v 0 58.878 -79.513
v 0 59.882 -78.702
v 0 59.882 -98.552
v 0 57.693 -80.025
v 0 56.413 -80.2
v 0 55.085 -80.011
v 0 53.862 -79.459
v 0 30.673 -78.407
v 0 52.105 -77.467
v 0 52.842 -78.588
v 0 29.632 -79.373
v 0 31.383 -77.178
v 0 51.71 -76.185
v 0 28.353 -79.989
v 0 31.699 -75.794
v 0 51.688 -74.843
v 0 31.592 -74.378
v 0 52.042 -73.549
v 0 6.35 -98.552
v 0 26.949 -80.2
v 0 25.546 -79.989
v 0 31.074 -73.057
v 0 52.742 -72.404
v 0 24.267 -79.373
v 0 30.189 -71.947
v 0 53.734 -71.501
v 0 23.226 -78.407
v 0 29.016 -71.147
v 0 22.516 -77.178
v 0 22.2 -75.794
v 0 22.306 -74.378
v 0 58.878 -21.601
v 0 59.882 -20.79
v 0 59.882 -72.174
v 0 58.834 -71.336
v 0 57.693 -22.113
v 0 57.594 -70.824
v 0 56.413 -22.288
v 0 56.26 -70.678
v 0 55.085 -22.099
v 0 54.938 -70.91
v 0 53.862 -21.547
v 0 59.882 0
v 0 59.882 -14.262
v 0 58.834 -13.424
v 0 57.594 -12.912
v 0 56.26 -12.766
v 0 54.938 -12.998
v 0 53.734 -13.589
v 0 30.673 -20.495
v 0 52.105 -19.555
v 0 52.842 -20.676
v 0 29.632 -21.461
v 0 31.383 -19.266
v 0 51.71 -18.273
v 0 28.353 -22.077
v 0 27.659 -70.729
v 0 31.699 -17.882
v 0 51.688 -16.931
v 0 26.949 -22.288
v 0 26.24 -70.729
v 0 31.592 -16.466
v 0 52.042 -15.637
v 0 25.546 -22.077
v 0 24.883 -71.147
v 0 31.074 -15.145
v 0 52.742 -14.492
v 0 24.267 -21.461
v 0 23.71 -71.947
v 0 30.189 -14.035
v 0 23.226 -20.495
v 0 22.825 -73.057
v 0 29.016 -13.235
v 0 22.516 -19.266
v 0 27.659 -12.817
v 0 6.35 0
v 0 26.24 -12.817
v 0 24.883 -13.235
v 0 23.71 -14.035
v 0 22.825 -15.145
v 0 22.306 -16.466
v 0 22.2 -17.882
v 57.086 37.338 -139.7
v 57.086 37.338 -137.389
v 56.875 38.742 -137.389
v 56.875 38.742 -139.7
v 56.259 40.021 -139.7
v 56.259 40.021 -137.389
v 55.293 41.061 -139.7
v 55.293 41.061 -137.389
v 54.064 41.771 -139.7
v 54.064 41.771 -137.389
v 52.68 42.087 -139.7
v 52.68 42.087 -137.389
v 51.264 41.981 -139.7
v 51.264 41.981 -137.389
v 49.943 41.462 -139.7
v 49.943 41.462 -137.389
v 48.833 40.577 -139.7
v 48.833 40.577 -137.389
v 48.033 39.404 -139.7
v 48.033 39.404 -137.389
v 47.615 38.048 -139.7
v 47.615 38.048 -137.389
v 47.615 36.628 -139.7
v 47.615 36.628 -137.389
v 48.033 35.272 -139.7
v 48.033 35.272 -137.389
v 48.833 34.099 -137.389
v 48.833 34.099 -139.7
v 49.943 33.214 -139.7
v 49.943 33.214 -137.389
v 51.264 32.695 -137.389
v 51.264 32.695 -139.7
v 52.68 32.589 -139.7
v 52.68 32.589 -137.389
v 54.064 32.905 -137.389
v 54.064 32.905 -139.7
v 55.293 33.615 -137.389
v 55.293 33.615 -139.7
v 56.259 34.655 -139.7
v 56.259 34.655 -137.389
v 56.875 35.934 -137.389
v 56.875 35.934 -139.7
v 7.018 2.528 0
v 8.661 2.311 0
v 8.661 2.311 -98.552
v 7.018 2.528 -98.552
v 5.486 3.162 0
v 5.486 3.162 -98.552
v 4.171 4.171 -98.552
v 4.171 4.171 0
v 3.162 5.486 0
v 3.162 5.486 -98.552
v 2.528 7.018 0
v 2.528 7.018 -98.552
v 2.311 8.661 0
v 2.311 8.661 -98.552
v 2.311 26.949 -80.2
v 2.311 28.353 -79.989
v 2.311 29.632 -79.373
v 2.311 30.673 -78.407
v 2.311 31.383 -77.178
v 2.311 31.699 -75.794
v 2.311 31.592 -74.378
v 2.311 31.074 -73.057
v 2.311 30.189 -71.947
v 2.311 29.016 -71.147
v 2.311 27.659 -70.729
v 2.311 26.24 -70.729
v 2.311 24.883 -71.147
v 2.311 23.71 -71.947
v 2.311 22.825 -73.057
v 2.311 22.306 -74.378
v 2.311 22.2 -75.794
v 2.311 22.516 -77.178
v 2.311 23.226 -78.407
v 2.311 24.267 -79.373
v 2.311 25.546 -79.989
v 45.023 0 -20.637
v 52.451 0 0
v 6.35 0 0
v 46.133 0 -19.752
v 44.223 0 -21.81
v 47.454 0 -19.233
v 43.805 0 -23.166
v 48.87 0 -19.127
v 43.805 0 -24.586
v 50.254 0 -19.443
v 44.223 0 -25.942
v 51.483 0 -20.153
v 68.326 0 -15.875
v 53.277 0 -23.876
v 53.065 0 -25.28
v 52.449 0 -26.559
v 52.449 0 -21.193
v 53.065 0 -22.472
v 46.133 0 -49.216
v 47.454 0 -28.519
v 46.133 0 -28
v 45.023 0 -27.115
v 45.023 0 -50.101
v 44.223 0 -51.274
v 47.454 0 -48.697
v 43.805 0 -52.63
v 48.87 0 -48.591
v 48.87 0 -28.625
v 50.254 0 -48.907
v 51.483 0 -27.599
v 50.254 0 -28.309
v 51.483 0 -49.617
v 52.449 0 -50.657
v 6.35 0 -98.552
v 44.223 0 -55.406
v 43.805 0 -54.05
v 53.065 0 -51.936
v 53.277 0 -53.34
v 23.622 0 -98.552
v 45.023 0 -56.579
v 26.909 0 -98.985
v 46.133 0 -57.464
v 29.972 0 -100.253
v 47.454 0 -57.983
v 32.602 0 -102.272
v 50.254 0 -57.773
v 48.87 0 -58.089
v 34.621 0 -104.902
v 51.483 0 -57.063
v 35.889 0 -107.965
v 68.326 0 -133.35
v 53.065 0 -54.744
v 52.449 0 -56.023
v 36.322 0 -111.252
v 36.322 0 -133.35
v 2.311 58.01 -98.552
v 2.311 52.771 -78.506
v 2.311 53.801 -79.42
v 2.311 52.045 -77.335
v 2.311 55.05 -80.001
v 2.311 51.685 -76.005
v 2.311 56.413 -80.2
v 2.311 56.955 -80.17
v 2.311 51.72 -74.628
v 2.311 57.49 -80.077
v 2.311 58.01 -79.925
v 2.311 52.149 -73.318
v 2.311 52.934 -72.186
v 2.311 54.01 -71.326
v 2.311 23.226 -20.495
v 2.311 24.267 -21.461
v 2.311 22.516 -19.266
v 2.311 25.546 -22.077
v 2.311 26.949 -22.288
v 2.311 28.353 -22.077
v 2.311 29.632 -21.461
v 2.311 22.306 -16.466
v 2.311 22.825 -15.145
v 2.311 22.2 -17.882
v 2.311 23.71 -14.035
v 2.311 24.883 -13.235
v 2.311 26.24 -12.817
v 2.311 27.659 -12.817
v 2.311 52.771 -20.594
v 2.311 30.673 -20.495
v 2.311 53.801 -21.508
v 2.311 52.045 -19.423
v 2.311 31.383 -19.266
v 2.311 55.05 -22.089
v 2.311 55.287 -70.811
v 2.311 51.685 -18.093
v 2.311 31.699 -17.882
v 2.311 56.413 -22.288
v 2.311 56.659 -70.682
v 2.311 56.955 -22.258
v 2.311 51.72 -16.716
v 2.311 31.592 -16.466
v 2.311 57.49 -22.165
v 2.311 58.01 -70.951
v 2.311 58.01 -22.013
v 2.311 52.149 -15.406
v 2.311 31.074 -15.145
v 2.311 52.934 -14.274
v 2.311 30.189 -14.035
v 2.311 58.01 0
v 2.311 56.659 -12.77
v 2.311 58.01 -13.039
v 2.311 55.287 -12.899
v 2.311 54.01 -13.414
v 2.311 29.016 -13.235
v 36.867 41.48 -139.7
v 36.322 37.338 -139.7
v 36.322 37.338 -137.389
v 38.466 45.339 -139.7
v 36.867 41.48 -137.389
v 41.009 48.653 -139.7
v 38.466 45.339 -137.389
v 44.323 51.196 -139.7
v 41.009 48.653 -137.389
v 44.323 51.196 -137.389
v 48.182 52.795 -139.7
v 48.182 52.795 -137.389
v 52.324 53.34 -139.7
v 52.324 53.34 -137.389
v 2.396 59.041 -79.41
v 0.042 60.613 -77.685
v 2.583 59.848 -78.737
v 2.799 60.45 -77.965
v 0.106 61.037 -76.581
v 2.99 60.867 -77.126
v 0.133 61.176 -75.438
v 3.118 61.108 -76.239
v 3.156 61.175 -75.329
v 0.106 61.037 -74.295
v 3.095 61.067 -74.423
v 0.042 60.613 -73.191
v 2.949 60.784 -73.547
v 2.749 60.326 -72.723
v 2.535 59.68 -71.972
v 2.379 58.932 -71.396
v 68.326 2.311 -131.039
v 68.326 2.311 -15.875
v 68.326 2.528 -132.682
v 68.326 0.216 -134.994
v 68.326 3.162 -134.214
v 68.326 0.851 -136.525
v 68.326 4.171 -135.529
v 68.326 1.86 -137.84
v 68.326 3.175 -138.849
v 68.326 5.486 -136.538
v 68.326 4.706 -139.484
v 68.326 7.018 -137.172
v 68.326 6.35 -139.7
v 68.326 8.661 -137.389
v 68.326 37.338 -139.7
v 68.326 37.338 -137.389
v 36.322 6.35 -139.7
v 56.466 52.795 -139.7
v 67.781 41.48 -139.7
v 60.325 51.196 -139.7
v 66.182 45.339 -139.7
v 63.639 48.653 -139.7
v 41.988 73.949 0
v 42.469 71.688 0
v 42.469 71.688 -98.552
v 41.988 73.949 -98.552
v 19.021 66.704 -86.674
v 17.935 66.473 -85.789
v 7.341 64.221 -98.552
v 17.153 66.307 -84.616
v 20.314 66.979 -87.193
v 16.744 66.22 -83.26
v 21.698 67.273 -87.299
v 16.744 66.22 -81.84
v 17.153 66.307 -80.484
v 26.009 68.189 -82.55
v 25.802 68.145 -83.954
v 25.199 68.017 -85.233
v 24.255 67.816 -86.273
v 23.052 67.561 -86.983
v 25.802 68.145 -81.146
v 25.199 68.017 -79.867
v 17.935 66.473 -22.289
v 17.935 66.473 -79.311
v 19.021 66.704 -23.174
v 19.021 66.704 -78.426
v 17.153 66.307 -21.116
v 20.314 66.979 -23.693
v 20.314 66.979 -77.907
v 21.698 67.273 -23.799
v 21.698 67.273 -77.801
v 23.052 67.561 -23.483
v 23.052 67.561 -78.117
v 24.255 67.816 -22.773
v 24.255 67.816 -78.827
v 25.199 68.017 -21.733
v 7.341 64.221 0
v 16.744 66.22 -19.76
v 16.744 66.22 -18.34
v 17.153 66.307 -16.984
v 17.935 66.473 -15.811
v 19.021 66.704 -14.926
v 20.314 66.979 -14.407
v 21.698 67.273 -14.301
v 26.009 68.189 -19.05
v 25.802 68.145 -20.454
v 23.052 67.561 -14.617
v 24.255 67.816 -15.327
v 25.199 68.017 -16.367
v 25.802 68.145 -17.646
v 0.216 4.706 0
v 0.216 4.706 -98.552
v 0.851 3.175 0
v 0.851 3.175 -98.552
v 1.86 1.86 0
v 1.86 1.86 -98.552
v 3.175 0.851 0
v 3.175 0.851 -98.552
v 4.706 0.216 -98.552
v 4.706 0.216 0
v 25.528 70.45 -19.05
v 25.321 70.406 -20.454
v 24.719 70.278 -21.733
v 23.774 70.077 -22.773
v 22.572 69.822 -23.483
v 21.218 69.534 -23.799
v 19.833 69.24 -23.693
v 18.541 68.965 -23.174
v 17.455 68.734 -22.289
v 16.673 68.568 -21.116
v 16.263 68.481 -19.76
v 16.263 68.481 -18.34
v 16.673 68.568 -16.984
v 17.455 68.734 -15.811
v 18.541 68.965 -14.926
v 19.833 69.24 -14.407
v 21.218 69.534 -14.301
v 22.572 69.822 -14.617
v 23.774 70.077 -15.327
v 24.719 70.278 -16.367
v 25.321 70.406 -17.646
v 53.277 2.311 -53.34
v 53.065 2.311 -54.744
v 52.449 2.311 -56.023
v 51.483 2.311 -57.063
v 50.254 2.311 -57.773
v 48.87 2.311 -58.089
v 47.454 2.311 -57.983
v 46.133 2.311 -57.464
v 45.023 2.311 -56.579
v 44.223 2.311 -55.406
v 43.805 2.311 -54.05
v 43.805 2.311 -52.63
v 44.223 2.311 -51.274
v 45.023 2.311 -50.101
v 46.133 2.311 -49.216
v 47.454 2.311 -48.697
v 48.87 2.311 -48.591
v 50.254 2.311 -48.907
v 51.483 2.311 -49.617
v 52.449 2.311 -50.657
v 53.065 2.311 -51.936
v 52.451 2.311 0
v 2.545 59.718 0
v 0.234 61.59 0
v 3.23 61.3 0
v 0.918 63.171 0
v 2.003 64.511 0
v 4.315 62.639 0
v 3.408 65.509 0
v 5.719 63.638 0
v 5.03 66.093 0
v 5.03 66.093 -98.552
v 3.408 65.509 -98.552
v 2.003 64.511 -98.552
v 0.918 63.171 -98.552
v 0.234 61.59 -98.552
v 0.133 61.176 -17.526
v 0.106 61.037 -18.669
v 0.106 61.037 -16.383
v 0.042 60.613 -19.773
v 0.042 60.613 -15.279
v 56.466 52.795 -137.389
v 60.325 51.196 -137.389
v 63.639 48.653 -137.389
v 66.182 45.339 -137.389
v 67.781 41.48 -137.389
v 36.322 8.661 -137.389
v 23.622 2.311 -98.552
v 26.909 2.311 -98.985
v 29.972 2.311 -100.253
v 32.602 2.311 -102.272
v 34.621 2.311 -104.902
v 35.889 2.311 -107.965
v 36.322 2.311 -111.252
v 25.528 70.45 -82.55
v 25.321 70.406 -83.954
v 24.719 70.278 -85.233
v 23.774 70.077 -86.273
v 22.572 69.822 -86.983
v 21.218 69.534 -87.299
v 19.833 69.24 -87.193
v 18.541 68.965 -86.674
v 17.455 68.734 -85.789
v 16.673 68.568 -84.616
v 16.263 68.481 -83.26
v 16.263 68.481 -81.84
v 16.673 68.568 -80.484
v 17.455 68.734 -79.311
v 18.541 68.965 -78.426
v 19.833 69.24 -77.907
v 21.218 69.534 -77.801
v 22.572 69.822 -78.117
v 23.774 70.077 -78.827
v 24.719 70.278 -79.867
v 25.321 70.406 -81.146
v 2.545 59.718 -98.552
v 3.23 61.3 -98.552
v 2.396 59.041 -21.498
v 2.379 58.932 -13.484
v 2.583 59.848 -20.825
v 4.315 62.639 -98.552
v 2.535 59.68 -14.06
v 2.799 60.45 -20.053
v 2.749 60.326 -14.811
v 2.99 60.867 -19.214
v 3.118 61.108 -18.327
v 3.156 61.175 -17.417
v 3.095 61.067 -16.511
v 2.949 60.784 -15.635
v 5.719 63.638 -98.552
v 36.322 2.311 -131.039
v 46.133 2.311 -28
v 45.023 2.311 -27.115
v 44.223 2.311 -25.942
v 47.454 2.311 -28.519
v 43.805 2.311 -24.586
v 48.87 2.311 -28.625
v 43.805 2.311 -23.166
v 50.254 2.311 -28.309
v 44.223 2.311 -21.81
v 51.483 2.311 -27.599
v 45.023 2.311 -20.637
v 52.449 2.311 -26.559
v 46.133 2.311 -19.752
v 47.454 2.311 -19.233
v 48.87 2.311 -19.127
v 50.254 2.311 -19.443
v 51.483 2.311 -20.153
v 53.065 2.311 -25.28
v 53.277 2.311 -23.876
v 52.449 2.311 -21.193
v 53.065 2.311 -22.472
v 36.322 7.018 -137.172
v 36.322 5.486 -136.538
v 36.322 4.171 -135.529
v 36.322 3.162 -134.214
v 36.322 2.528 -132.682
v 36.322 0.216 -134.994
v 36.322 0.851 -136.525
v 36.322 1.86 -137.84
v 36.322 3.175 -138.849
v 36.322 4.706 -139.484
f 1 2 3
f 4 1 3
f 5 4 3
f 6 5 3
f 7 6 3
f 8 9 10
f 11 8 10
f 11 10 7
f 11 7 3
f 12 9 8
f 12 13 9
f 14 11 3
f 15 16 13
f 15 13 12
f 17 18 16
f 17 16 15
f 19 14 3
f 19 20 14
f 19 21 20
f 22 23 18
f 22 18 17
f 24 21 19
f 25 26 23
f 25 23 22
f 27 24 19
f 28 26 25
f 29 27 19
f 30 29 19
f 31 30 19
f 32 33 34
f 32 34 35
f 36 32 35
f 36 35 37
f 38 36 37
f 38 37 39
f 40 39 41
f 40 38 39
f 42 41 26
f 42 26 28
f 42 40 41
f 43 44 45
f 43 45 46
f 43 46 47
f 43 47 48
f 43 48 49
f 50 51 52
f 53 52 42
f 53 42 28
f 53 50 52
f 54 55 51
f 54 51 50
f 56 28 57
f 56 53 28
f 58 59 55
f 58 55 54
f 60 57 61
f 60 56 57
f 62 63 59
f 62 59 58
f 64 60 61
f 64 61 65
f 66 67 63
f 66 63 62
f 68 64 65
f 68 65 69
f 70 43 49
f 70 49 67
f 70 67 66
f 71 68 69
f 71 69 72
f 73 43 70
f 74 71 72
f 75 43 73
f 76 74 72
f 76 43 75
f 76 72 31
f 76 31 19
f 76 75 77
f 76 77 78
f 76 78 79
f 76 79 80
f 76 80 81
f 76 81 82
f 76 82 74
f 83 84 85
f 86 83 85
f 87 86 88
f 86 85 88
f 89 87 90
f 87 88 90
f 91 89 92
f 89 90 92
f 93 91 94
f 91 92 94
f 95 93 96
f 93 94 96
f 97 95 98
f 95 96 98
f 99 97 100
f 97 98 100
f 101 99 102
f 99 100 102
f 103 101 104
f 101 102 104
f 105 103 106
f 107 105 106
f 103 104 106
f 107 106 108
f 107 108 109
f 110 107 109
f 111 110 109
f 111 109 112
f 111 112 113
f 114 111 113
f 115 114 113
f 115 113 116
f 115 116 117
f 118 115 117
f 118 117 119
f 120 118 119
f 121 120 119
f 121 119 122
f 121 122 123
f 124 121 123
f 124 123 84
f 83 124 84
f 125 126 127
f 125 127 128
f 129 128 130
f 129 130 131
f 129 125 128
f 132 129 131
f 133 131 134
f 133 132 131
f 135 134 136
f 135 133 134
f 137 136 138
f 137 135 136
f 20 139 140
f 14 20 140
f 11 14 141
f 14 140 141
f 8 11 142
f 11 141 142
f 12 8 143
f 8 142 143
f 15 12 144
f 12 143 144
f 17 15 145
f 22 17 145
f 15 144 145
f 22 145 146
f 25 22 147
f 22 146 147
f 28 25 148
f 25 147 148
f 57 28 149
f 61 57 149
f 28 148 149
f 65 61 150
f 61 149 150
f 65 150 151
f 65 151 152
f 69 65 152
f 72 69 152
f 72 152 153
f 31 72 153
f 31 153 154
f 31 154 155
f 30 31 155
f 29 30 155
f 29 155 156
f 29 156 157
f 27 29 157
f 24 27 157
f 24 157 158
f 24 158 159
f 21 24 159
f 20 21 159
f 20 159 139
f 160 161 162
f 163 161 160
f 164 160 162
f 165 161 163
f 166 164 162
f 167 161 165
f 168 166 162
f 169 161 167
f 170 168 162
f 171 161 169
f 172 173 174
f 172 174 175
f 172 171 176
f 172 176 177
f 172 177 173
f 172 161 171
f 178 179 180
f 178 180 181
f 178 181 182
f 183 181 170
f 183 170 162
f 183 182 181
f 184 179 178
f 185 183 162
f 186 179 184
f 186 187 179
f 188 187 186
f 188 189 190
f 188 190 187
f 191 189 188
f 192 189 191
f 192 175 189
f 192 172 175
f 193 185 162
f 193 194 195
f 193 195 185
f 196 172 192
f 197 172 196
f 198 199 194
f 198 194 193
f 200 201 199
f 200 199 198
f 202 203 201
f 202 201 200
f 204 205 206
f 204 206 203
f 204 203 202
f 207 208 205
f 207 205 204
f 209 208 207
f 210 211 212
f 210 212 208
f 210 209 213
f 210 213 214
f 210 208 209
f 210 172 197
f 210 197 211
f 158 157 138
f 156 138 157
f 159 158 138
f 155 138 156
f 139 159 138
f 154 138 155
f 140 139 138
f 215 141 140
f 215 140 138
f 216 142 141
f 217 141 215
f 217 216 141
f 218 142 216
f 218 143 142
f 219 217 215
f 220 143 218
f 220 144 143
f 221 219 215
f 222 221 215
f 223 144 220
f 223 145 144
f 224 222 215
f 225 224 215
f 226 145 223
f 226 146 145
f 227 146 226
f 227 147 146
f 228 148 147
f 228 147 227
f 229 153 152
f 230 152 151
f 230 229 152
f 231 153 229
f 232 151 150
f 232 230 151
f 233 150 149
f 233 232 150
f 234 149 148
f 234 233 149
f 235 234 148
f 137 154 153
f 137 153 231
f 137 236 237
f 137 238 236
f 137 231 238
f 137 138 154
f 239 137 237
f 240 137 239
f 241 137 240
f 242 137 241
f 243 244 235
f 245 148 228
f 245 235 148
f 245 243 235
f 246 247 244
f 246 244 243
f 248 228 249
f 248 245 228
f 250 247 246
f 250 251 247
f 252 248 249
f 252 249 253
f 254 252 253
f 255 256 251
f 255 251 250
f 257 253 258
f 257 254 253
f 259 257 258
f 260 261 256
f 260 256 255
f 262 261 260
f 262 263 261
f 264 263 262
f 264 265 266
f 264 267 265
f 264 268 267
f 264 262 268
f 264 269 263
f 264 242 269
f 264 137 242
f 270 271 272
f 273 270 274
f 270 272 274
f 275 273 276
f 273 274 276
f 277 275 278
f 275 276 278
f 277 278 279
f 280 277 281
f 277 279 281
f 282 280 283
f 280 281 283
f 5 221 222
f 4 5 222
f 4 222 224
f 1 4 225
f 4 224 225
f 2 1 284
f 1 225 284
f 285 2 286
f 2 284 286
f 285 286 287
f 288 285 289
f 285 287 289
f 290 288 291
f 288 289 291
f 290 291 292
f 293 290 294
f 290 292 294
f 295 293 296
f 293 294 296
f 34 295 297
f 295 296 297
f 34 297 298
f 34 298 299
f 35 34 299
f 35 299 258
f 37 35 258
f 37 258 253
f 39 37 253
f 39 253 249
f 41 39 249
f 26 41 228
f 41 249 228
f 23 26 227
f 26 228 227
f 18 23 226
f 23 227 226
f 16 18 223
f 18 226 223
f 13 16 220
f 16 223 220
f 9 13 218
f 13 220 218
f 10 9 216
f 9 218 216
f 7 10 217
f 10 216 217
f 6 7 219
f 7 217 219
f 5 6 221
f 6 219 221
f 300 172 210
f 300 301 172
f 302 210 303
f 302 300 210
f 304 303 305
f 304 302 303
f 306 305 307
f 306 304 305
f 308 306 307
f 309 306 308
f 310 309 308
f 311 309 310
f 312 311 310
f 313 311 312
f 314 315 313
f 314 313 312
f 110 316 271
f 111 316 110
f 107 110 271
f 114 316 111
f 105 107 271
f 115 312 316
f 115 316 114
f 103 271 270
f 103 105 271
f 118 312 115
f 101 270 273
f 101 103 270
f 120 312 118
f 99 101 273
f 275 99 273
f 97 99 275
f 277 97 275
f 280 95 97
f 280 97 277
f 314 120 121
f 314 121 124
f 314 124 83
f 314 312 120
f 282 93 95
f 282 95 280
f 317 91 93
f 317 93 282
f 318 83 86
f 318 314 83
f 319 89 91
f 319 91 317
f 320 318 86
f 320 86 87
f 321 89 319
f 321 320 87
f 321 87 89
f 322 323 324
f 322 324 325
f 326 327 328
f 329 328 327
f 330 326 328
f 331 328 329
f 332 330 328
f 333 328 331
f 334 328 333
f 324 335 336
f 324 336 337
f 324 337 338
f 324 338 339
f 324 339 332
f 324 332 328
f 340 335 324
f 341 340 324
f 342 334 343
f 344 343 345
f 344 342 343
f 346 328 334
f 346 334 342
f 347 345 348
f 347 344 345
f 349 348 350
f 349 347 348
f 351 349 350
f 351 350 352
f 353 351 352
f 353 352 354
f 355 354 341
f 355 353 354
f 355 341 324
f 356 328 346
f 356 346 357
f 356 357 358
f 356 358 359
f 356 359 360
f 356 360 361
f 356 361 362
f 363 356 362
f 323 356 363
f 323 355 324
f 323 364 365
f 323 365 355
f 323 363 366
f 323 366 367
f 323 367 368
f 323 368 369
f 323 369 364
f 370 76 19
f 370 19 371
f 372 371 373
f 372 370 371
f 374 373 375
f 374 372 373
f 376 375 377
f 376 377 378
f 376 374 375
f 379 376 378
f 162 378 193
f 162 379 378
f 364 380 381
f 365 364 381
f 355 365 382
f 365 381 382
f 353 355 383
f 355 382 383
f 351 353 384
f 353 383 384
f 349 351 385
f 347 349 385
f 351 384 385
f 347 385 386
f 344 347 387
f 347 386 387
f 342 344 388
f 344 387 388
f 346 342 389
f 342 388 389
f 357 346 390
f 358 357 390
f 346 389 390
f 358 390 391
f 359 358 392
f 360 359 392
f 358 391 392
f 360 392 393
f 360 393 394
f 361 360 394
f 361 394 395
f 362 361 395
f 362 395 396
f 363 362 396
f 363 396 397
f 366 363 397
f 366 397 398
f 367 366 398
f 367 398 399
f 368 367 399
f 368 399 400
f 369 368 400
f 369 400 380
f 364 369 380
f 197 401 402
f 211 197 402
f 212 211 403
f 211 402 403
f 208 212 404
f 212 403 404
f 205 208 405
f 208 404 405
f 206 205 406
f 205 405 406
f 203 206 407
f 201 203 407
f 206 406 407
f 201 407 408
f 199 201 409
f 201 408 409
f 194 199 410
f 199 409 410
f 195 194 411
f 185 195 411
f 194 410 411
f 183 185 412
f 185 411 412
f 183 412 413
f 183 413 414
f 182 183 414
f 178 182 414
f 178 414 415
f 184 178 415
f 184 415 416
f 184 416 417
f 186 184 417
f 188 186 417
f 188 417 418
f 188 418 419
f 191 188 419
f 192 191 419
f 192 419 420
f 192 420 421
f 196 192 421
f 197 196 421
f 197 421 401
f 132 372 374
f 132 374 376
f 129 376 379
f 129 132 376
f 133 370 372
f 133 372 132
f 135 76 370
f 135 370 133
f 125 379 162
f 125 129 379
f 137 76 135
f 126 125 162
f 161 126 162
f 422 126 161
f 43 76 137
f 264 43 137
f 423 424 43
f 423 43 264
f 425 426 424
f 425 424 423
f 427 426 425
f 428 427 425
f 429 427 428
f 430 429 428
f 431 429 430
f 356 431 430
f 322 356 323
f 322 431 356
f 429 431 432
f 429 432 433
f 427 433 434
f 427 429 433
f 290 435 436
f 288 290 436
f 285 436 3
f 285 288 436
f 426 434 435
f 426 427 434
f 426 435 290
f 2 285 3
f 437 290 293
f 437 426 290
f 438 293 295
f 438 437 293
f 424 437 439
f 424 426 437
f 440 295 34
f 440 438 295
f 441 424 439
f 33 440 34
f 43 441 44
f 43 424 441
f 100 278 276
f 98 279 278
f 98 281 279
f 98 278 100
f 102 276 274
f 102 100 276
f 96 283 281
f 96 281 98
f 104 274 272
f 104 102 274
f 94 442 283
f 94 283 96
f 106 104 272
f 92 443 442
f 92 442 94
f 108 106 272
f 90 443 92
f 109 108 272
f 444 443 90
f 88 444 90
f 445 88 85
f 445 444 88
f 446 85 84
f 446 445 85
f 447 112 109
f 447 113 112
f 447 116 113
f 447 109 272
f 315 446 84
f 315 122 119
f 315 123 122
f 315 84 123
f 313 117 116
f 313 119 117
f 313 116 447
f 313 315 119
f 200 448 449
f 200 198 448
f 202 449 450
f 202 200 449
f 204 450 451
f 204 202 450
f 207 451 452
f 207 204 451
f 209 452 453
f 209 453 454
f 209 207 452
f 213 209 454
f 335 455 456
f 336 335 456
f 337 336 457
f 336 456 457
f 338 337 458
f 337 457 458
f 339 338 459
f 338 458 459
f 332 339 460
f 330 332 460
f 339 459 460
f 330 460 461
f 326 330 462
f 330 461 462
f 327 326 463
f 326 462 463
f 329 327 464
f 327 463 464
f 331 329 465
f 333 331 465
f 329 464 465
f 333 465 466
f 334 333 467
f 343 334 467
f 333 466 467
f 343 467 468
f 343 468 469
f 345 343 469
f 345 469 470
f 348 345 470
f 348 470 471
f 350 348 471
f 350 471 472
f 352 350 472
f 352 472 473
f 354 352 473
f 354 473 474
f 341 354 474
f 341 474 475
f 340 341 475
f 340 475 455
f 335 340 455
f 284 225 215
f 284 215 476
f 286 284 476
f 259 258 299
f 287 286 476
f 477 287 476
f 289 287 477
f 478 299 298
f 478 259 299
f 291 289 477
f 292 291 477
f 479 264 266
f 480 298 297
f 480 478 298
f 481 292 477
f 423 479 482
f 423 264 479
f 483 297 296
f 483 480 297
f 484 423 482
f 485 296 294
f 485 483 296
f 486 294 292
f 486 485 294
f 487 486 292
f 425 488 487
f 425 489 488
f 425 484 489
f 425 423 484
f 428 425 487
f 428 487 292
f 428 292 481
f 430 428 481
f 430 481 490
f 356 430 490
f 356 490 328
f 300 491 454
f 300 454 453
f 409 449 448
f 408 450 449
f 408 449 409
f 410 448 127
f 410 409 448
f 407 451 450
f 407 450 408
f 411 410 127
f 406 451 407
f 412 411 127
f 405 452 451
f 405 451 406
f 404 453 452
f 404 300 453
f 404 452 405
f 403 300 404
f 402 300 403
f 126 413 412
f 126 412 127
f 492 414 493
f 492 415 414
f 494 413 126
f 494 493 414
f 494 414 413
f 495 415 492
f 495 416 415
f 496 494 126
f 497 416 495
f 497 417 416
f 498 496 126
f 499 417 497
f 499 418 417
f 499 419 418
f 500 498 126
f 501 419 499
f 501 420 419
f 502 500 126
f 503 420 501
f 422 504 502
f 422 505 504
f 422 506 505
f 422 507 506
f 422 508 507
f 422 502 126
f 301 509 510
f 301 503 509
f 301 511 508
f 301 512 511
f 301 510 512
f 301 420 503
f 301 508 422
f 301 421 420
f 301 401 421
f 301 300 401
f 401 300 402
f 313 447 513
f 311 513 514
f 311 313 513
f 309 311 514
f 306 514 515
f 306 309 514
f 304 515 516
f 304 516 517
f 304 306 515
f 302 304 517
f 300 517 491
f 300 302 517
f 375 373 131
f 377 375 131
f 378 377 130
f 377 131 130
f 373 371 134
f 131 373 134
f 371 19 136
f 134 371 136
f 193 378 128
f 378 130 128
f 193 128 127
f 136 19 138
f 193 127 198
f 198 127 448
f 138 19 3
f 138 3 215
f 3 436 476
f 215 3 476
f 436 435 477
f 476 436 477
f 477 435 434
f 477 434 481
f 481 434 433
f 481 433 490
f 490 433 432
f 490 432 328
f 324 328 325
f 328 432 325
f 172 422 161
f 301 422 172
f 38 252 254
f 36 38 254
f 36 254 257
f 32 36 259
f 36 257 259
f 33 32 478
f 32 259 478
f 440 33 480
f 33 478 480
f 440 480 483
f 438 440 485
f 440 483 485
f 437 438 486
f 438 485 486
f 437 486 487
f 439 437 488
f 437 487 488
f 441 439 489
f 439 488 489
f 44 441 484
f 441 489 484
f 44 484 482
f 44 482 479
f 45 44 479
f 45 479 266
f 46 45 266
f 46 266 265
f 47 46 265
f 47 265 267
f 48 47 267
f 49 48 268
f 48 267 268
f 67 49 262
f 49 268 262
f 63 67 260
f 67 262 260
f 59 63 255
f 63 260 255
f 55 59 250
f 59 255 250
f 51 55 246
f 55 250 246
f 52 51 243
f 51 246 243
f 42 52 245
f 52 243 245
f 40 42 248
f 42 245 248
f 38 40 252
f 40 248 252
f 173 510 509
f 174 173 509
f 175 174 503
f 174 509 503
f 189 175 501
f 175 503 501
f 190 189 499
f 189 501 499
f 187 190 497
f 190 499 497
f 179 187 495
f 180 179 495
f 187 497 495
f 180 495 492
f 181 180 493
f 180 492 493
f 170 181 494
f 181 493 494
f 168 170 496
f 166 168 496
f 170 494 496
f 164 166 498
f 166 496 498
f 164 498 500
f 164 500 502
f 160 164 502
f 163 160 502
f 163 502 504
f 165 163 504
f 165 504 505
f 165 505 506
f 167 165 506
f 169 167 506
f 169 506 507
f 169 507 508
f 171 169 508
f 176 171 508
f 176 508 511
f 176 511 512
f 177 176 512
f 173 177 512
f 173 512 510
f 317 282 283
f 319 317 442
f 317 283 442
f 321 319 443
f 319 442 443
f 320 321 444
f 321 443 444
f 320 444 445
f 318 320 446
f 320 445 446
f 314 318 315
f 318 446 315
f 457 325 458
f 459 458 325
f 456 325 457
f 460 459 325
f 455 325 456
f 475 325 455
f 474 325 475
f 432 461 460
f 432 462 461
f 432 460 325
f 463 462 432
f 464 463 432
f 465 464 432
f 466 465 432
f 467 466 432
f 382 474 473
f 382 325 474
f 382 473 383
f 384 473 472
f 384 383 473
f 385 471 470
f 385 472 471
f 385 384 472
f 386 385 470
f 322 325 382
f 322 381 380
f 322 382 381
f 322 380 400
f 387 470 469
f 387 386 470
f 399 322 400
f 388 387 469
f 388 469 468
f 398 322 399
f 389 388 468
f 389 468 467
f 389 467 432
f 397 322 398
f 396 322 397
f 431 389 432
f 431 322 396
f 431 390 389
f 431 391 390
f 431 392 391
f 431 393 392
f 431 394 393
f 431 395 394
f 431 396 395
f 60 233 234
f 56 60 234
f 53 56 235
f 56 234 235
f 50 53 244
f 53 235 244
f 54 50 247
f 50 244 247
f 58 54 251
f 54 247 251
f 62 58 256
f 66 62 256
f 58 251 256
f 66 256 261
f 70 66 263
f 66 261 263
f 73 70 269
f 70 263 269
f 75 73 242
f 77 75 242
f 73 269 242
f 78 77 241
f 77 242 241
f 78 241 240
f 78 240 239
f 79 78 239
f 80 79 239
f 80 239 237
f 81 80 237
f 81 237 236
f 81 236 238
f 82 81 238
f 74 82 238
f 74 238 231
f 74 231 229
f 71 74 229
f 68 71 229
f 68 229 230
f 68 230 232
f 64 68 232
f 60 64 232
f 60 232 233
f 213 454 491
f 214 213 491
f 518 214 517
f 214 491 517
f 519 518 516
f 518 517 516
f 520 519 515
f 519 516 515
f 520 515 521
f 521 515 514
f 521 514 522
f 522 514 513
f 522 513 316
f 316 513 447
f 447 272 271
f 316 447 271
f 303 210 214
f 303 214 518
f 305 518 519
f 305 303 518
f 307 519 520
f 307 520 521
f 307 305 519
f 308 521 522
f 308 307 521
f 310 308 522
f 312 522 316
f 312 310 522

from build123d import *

# Parameters (mm, degrees)
BOSS_EXTRUDE1_DEPTH     = 98.552
BOSS_EXTRUDE2_DEPTH     = 32.004
SKETCH3_R               = 4.7625
CUT_EXTRUDE1_DEPTH      = 3.3114
FILLET1_R               = 12.7
SKETCH4_R               = 4.7625
CUT_EXTRUDE2_DEPTH      = 3.3114
SKETCH5_R               = 4.7625
CUT_EXTRUDE3_DEPTH      = 67.0146
CUT_EXTRUDE3_DEPTH_BACK = 3.3114
CUT_EXTRUDE4_REACH      = 79.809
SKETCH6_R               = 4.7625


with BuildPart() as part:
    # Sketch1 → Boss-Extrude1 (new body)
    with BuildSketch(Plane.XY):
        with BuildLine():
            Line((6.35, 0), (68.326, 0))
            Line((68.326, 0), (68.326, 2.3114))
            Line((68.326, 2.3114), (8.6614, 2.3114))
            ThreePointArc((8.6614, 2.3114), (4.171271939, 4.171271939), (2.3114, 8.6614))
            Line((2.3114, 8.6614), (2.3114, 58.010136575))
            ThreePointArc((2.3114, 58.010136575), (3.726523145, 62.006321058), (7.341160763, 64.22137384))
            Line((7.341160763, 64.22137384), (42.468530991, 71.687926876))
            Line((42.468530991, 71.687926876), (41.987963909, 73.94881724))
            Line((41.987963909, 73.94881724), (5.029760763, 66.093108654))
            ThreePointArc((5.029760763, 66.093108654), (1.415123145, 63.878055872), (0, 59.881871389))
            Line((0, 59.881871389), (0, 6.35))
            ThreePointArc((0, 6.35), (1.859871939, 1.859871939), (6.35, 0))
        make_face()
    extrude(amount=-BOSS_EXTRUDE1_DEPTH)

    # Sketch2 → Boss-Extrude2 (add)
    with BuildSketch(Plane(origin=(68.326, 0, 0), x_dir=(0, 0, -1), z_dir=(1, 0, 0))):
        with BuildLine():
            Line((98.552, 0), (133.35, 0))
            ThreePointArc((133.35, 0), (137.840128061, 1.859871939), (139.7, 6.35))
            Line((139.7, 6.35), (139.7, 53.34))
            Line((139.7, 53.34), (137.3886, 53.34))
            Line((137.3886, 53.34), (137.3886, 8.6614))
            ThreePointArc((137.3886, 8.6614), (135.528728061, 4.171271939), (131.0386, 2.3114))
            Line((131.0386, 2.3114), (98.552, 2.3114))
            Line((98.552, 2.3114), (98.552, 0))
        make_face()
    extrude(amount=-BOSS_EXTRUDE2_DEPTH)

    # Sketch3 → Cut-Extrude1 (cut, through all)
    with BuildSketch(Plane.XY.offset(-137.3886)):
        with BuildLine():
            Line((36.322, 53.34), (36.322, 37.338))
            ThreePointArc((36.322, 37.338), (41.008877287, 48.653122713), (52.324, 53.34))
            Line((52.324, 53.34), (36.322, 53.34))
        make_face()
        with BuildLine():
            ThreePointArc((52.324, 53.34), (63.639122713, 48.653122713), (68.326, 37.338))
            Line((68.326, 37.338), (68.326, 53.34))
            Line((68.326, 53.34), (52.324, 53.34))
        make_face()
        with Locations((52.324, 37.338)):
            Circle(SKETCH3_R)
    extrude(amount=-CUT_EXTRUDE1_DEPTH, mode=Mode.SUBTRACT)

    # Fillet1
    fillet1_edges = [part.edges().sort_by_distance(p)[0] for p in [
        (36.322, 1.1557, -98.552),
    ]]
    fillet(fillet1_edges, radius=FILLET1_R)

    # Sketch4 → Cut-Extrude2 (cut, through all)
    with BuildSketch(Plane(origin=(0, 2.3114, 0), x_dir=(1, 0, 0), z_dir=(0, 1, 0))):
        with Locations((48.514, 23.876)):
            Circle(SKETCH4_R)
        with Locations((48.514, 53.34)):
            Circle(SKETCH4_R)
        Polygon((52.451, 0), (68.326, 15.875), (68.326, 0), align=None)
    extrude(amount=-CUT_EXTRUDE2_DEPTH, mode=Mode.SUBTRACT)

    # Sketch5 → Cut-Extrude3 (cut, two sides)
    with BuildSketch(Plane(origin=(2.3114, 0, 0), x_dir=(0, 0, -1), z_dir=(1, 0, 0))) as cut_extrude3_sk:
        with Locations((17.526, 26.9494)):
            Circle(SKETCH5_R)
        with Locations((75.438, 26.9494)):
            Circle(SKETCH5_R)
        with Locations((17.526, 56.4134)):
            Circle(SKETCH5_R)
        with Locations((75.438, 56.4134)):
            Circle(SKETCH5_R)
    extrude(amount=CUT_EXTRUDE3_DEPTH, mode=Mode.SUBTRACT)
    extrude(cut_extrude3_sk.sketch, amount=-CUT_EXTRUDE3_DEPTH_BACK, mode=Mode.SUBTRACT)

    # Sketch6 → Cut-Extrude4 (cut, up to next)
    with BuildSketch(Plane(origin=(-13.22382174, 62.213189919, 0), x_dir=(0.978147601, 0.207911691, 0), z_dir=(-0.207911691, 0.978147601, 0)), mode=Mode.PRIVATE) as cut_extrude4_sk1:
        with Locations((34.855249784, 82.55)):
            Circle(SKETCH6_R)
    cut_extrude4_tool1 = extrude(cut_extrude4_sk1.sketch, amount=-CUT_EXTRUDE4_REACH, mode=Mode.PRIVATE) & part.part
    add(cut_extrude4_tool1.solids().sort_by_distance((20.869757, 69.460004, -82.55))[0], mode=Mode.SUBTRACT)
    # Sketch6 → Cut-Extrude4 (cut, up to next)
    with BuildSketch(Plane(origin=(-13.22382174, 62.213189919, 0), x_dir=(0.978147601, 0.207911691, 0), z_dir=(-0.207911691, 0.978147601, 0)), mode=Mode.PRIVATE) as cut_extrude4_sk2:
        with Locations((34.855249784, 19.05)):
            Circle(SKETCH6_R)
    cut_extrude4_tool2 = extrude(cut_extrude4_sk2.sketch, amount=-CUT_EXTRUDE4_REACH, mode=Mode.PRIVATE) & part.part
    add(cut_extrude4_tool2.solids().sort_by_distance((20.869757, 69.460004, -19.05))[0], mode=Mode.SUBTRACT)


solid = part.part
